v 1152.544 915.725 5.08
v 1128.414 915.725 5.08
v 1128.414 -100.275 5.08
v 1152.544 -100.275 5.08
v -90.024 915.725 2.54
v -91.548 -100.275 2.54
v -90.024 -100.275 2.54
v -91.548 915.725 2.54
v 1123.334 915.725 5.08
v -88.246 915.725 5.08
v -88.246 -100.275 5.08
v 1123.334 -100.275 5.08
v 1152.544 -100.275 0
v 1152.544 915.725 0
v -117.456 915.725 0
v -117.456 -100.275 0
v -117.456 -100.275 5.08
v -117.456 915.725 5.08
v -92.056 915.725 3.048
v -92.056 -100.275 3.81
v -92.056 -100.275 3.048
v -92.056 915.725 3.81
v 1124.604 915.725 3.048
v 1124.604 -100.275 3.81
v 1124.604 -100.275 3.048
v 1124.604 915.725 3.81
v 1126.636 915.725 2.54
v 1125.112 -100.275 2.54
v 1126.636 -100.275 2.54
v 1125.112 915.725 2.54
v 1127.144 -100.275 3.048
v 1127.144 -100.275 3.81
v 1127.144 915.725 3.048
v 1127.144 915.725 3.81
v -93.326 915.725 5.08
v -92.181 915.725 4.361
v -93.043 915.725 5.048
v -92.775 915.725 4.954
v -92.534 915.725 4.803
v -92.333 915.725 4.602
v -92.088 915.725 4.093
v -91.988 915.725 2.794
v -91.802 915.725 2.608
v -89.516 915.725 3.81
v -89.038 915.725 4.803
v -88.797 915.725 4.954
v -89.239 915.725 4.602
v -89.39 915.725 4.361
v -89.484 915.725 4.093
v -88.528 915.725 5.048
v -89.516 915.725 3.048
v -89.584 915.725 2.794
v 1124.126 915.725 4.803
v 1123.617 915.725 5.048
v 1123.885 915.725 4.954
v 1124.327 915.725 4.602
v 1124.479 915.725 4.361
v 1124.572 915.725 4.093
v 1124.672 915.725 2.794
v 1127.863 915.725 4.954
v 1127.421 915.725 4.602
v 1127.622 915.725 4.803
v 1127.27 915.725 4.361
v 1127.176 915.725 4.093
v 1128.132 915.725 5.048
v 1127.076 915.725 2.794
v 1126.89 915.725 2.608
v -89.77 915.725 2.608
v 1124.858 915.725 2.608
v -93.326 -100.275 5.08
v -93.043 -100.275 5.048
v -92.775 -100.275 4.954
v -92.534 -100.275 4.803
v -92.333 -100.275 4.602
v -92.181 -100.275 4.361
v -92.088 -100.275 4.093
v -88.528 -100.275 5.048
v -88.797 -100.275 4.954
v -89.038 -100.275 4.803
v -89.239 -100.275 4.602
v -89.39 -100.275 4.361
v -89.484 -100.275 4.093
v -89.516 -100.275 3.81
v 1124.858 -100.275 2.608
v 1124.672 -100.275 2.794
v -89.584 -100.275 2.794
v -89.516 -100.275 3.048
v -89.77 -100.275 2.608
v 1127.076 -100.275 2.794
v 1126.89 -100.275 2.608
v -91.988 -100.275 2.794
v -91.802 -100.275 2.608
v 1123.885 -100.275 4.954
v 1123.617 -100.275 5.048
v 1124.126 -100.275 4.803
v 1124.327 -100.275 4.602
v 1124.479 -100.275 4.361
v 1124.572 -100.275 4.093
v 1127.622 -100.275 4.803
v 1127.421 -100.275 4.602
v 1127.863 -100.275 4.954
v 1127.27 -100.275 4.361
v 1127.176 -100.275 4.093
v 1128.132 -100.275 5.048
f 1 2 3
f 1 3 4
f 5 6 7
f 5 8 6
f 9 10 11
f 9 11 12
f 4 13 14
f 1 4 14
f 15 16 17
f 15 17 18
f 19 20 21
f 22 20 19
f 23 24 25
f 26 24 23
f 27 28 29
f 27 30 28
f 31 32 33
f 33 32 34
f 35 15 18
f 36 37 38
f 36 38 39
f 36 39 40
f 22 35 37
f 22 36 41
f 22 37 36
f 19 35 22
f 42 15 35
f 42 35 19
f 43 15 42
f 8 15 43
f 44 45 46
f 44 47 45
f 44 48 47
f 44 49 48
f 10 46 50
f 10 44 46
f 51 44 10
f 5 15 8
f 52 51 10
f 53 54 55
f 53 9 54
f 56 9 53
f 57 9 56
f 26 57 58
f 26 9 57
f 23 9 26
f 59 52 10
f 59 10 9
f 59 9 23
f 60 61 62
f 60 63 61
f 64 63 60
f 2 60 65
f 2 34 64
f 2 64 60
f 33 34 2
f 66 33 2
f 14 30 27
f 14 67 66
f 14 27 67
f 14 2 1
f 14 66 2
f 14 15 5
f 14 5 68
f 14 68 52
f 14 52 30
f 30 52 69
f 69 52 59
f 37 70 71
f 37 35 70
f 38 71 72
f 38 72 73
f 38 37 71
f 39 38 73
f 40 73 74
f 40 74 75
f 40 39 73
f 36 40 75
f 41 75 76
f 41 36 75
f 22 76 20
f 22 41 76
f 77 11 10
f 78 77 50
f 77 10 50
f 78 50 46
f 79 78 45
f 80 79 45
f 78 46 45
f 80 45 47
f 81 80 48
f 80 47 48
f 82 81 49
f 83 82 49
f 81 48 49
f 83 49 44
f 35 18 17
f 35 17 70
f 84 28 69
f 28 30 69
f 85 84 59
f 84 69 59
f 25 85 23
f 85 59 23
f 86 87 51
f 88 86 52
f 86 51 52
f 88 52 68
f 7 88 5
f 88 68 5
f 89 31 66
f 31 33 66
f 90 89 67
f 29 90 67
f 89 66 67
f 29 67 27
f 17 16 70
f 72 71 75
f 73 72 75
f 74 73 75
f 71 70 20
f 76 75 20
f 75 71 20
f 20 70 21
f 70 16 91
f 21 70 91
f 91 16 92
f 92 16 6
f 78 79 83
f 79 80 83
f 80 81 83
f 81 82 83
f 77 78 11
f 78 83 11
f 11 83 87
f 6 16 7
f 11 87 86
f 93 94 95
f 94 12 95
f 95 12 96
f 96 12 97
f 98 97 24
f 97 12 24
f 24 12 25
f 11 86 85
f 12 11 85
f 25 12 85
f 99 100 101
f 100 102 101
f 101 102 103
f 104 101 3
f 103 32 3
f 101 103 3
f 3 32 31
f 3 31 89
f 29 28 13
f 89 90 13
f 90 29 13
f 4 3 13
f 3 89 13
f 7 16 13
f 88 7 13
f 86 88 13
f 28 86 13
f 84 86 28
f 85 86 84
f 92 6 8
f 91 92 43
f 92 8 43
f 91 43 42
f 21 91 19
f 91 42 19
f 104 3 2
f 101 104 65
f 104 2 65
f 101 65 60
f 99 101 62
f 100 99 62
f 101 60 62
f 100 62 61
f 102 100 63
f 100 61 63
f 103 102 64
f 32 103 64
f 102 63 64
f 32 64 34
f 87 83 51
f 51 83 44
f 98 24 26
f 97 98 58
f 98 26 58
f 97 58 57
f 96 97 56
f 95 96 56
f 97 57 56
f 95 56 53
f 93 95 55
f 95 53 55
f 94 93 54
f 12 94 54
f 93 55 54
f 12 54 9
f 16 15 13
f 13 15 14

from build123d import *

# Parameters (mm, degrees)
F0_W     = 1270
F0_H     = 1016
F1_DEPTH = 5.08
F2_W     = 2.54
F2_H     = 1016
F3_DEPTH = 2.54
F4_R     = 1.27
F5_R     = 0.508
F6_R     = 1.27
F7_R     = 0.508


with BuildPart() as f1:
    # F0 (on Top) → F1 (new body)
    with BuildSketch(Plane.XY):
        with Locations((517.544276, 407.724813)):
            Rectangle(F0_W, F0_H)
    extrude(amount=F1_DEPTH)

    # F2 (on face) → F3 (cut)
    with BuildSketch(Plane.XY.offset(5.08)):
        with Locations((1125.874276, 407.724813)):
            Rectangle(F2_W, F2_H)
        with Locations((-90.785724, 407.724813)):
            Rectangle(F2_W, F2_H)
    extrude(amount=-F3_DEPTH, mode=Mode.SUBTRACT)

    # F4
    f4_edges = [f1.edges().sort_by_distance(p)[0] for p in [
        (1127.144276, 407.724813, 5.08),
        (1124.604276, 407.724813, 5.08),
    ]]
    fillet(f4_edges, radius=F4_R)

    # F5
    f5_edges = [f1.edges().sort_by_distance(p)[0] for p in [
        (1127.144276, 407.724813, 2.54),
        (1124.604276, 407.724813, 2.54),
    ]]
    fillet(f5_edges, radius=F5_R)

    # F6
    f6_edges = [f1.edges().sort_by_distance(p)[0] for p in [
        (-89.515724, 407.724813, 5.08),
        (-92.055724, 407.724813, 5.08),
    ]]
    fillet(f6_edges, radius=F6_R)

    # F7
    f7_edges = [f1.edges().sort_by_distance(p)[0] for p in [
        (-92.055724, 407.724813, 2.54),
        (-89.515724, 407.724813, 2.54),
    ]]
    fillet(f7_edges, radius=F7_R)


solid = f1.part
